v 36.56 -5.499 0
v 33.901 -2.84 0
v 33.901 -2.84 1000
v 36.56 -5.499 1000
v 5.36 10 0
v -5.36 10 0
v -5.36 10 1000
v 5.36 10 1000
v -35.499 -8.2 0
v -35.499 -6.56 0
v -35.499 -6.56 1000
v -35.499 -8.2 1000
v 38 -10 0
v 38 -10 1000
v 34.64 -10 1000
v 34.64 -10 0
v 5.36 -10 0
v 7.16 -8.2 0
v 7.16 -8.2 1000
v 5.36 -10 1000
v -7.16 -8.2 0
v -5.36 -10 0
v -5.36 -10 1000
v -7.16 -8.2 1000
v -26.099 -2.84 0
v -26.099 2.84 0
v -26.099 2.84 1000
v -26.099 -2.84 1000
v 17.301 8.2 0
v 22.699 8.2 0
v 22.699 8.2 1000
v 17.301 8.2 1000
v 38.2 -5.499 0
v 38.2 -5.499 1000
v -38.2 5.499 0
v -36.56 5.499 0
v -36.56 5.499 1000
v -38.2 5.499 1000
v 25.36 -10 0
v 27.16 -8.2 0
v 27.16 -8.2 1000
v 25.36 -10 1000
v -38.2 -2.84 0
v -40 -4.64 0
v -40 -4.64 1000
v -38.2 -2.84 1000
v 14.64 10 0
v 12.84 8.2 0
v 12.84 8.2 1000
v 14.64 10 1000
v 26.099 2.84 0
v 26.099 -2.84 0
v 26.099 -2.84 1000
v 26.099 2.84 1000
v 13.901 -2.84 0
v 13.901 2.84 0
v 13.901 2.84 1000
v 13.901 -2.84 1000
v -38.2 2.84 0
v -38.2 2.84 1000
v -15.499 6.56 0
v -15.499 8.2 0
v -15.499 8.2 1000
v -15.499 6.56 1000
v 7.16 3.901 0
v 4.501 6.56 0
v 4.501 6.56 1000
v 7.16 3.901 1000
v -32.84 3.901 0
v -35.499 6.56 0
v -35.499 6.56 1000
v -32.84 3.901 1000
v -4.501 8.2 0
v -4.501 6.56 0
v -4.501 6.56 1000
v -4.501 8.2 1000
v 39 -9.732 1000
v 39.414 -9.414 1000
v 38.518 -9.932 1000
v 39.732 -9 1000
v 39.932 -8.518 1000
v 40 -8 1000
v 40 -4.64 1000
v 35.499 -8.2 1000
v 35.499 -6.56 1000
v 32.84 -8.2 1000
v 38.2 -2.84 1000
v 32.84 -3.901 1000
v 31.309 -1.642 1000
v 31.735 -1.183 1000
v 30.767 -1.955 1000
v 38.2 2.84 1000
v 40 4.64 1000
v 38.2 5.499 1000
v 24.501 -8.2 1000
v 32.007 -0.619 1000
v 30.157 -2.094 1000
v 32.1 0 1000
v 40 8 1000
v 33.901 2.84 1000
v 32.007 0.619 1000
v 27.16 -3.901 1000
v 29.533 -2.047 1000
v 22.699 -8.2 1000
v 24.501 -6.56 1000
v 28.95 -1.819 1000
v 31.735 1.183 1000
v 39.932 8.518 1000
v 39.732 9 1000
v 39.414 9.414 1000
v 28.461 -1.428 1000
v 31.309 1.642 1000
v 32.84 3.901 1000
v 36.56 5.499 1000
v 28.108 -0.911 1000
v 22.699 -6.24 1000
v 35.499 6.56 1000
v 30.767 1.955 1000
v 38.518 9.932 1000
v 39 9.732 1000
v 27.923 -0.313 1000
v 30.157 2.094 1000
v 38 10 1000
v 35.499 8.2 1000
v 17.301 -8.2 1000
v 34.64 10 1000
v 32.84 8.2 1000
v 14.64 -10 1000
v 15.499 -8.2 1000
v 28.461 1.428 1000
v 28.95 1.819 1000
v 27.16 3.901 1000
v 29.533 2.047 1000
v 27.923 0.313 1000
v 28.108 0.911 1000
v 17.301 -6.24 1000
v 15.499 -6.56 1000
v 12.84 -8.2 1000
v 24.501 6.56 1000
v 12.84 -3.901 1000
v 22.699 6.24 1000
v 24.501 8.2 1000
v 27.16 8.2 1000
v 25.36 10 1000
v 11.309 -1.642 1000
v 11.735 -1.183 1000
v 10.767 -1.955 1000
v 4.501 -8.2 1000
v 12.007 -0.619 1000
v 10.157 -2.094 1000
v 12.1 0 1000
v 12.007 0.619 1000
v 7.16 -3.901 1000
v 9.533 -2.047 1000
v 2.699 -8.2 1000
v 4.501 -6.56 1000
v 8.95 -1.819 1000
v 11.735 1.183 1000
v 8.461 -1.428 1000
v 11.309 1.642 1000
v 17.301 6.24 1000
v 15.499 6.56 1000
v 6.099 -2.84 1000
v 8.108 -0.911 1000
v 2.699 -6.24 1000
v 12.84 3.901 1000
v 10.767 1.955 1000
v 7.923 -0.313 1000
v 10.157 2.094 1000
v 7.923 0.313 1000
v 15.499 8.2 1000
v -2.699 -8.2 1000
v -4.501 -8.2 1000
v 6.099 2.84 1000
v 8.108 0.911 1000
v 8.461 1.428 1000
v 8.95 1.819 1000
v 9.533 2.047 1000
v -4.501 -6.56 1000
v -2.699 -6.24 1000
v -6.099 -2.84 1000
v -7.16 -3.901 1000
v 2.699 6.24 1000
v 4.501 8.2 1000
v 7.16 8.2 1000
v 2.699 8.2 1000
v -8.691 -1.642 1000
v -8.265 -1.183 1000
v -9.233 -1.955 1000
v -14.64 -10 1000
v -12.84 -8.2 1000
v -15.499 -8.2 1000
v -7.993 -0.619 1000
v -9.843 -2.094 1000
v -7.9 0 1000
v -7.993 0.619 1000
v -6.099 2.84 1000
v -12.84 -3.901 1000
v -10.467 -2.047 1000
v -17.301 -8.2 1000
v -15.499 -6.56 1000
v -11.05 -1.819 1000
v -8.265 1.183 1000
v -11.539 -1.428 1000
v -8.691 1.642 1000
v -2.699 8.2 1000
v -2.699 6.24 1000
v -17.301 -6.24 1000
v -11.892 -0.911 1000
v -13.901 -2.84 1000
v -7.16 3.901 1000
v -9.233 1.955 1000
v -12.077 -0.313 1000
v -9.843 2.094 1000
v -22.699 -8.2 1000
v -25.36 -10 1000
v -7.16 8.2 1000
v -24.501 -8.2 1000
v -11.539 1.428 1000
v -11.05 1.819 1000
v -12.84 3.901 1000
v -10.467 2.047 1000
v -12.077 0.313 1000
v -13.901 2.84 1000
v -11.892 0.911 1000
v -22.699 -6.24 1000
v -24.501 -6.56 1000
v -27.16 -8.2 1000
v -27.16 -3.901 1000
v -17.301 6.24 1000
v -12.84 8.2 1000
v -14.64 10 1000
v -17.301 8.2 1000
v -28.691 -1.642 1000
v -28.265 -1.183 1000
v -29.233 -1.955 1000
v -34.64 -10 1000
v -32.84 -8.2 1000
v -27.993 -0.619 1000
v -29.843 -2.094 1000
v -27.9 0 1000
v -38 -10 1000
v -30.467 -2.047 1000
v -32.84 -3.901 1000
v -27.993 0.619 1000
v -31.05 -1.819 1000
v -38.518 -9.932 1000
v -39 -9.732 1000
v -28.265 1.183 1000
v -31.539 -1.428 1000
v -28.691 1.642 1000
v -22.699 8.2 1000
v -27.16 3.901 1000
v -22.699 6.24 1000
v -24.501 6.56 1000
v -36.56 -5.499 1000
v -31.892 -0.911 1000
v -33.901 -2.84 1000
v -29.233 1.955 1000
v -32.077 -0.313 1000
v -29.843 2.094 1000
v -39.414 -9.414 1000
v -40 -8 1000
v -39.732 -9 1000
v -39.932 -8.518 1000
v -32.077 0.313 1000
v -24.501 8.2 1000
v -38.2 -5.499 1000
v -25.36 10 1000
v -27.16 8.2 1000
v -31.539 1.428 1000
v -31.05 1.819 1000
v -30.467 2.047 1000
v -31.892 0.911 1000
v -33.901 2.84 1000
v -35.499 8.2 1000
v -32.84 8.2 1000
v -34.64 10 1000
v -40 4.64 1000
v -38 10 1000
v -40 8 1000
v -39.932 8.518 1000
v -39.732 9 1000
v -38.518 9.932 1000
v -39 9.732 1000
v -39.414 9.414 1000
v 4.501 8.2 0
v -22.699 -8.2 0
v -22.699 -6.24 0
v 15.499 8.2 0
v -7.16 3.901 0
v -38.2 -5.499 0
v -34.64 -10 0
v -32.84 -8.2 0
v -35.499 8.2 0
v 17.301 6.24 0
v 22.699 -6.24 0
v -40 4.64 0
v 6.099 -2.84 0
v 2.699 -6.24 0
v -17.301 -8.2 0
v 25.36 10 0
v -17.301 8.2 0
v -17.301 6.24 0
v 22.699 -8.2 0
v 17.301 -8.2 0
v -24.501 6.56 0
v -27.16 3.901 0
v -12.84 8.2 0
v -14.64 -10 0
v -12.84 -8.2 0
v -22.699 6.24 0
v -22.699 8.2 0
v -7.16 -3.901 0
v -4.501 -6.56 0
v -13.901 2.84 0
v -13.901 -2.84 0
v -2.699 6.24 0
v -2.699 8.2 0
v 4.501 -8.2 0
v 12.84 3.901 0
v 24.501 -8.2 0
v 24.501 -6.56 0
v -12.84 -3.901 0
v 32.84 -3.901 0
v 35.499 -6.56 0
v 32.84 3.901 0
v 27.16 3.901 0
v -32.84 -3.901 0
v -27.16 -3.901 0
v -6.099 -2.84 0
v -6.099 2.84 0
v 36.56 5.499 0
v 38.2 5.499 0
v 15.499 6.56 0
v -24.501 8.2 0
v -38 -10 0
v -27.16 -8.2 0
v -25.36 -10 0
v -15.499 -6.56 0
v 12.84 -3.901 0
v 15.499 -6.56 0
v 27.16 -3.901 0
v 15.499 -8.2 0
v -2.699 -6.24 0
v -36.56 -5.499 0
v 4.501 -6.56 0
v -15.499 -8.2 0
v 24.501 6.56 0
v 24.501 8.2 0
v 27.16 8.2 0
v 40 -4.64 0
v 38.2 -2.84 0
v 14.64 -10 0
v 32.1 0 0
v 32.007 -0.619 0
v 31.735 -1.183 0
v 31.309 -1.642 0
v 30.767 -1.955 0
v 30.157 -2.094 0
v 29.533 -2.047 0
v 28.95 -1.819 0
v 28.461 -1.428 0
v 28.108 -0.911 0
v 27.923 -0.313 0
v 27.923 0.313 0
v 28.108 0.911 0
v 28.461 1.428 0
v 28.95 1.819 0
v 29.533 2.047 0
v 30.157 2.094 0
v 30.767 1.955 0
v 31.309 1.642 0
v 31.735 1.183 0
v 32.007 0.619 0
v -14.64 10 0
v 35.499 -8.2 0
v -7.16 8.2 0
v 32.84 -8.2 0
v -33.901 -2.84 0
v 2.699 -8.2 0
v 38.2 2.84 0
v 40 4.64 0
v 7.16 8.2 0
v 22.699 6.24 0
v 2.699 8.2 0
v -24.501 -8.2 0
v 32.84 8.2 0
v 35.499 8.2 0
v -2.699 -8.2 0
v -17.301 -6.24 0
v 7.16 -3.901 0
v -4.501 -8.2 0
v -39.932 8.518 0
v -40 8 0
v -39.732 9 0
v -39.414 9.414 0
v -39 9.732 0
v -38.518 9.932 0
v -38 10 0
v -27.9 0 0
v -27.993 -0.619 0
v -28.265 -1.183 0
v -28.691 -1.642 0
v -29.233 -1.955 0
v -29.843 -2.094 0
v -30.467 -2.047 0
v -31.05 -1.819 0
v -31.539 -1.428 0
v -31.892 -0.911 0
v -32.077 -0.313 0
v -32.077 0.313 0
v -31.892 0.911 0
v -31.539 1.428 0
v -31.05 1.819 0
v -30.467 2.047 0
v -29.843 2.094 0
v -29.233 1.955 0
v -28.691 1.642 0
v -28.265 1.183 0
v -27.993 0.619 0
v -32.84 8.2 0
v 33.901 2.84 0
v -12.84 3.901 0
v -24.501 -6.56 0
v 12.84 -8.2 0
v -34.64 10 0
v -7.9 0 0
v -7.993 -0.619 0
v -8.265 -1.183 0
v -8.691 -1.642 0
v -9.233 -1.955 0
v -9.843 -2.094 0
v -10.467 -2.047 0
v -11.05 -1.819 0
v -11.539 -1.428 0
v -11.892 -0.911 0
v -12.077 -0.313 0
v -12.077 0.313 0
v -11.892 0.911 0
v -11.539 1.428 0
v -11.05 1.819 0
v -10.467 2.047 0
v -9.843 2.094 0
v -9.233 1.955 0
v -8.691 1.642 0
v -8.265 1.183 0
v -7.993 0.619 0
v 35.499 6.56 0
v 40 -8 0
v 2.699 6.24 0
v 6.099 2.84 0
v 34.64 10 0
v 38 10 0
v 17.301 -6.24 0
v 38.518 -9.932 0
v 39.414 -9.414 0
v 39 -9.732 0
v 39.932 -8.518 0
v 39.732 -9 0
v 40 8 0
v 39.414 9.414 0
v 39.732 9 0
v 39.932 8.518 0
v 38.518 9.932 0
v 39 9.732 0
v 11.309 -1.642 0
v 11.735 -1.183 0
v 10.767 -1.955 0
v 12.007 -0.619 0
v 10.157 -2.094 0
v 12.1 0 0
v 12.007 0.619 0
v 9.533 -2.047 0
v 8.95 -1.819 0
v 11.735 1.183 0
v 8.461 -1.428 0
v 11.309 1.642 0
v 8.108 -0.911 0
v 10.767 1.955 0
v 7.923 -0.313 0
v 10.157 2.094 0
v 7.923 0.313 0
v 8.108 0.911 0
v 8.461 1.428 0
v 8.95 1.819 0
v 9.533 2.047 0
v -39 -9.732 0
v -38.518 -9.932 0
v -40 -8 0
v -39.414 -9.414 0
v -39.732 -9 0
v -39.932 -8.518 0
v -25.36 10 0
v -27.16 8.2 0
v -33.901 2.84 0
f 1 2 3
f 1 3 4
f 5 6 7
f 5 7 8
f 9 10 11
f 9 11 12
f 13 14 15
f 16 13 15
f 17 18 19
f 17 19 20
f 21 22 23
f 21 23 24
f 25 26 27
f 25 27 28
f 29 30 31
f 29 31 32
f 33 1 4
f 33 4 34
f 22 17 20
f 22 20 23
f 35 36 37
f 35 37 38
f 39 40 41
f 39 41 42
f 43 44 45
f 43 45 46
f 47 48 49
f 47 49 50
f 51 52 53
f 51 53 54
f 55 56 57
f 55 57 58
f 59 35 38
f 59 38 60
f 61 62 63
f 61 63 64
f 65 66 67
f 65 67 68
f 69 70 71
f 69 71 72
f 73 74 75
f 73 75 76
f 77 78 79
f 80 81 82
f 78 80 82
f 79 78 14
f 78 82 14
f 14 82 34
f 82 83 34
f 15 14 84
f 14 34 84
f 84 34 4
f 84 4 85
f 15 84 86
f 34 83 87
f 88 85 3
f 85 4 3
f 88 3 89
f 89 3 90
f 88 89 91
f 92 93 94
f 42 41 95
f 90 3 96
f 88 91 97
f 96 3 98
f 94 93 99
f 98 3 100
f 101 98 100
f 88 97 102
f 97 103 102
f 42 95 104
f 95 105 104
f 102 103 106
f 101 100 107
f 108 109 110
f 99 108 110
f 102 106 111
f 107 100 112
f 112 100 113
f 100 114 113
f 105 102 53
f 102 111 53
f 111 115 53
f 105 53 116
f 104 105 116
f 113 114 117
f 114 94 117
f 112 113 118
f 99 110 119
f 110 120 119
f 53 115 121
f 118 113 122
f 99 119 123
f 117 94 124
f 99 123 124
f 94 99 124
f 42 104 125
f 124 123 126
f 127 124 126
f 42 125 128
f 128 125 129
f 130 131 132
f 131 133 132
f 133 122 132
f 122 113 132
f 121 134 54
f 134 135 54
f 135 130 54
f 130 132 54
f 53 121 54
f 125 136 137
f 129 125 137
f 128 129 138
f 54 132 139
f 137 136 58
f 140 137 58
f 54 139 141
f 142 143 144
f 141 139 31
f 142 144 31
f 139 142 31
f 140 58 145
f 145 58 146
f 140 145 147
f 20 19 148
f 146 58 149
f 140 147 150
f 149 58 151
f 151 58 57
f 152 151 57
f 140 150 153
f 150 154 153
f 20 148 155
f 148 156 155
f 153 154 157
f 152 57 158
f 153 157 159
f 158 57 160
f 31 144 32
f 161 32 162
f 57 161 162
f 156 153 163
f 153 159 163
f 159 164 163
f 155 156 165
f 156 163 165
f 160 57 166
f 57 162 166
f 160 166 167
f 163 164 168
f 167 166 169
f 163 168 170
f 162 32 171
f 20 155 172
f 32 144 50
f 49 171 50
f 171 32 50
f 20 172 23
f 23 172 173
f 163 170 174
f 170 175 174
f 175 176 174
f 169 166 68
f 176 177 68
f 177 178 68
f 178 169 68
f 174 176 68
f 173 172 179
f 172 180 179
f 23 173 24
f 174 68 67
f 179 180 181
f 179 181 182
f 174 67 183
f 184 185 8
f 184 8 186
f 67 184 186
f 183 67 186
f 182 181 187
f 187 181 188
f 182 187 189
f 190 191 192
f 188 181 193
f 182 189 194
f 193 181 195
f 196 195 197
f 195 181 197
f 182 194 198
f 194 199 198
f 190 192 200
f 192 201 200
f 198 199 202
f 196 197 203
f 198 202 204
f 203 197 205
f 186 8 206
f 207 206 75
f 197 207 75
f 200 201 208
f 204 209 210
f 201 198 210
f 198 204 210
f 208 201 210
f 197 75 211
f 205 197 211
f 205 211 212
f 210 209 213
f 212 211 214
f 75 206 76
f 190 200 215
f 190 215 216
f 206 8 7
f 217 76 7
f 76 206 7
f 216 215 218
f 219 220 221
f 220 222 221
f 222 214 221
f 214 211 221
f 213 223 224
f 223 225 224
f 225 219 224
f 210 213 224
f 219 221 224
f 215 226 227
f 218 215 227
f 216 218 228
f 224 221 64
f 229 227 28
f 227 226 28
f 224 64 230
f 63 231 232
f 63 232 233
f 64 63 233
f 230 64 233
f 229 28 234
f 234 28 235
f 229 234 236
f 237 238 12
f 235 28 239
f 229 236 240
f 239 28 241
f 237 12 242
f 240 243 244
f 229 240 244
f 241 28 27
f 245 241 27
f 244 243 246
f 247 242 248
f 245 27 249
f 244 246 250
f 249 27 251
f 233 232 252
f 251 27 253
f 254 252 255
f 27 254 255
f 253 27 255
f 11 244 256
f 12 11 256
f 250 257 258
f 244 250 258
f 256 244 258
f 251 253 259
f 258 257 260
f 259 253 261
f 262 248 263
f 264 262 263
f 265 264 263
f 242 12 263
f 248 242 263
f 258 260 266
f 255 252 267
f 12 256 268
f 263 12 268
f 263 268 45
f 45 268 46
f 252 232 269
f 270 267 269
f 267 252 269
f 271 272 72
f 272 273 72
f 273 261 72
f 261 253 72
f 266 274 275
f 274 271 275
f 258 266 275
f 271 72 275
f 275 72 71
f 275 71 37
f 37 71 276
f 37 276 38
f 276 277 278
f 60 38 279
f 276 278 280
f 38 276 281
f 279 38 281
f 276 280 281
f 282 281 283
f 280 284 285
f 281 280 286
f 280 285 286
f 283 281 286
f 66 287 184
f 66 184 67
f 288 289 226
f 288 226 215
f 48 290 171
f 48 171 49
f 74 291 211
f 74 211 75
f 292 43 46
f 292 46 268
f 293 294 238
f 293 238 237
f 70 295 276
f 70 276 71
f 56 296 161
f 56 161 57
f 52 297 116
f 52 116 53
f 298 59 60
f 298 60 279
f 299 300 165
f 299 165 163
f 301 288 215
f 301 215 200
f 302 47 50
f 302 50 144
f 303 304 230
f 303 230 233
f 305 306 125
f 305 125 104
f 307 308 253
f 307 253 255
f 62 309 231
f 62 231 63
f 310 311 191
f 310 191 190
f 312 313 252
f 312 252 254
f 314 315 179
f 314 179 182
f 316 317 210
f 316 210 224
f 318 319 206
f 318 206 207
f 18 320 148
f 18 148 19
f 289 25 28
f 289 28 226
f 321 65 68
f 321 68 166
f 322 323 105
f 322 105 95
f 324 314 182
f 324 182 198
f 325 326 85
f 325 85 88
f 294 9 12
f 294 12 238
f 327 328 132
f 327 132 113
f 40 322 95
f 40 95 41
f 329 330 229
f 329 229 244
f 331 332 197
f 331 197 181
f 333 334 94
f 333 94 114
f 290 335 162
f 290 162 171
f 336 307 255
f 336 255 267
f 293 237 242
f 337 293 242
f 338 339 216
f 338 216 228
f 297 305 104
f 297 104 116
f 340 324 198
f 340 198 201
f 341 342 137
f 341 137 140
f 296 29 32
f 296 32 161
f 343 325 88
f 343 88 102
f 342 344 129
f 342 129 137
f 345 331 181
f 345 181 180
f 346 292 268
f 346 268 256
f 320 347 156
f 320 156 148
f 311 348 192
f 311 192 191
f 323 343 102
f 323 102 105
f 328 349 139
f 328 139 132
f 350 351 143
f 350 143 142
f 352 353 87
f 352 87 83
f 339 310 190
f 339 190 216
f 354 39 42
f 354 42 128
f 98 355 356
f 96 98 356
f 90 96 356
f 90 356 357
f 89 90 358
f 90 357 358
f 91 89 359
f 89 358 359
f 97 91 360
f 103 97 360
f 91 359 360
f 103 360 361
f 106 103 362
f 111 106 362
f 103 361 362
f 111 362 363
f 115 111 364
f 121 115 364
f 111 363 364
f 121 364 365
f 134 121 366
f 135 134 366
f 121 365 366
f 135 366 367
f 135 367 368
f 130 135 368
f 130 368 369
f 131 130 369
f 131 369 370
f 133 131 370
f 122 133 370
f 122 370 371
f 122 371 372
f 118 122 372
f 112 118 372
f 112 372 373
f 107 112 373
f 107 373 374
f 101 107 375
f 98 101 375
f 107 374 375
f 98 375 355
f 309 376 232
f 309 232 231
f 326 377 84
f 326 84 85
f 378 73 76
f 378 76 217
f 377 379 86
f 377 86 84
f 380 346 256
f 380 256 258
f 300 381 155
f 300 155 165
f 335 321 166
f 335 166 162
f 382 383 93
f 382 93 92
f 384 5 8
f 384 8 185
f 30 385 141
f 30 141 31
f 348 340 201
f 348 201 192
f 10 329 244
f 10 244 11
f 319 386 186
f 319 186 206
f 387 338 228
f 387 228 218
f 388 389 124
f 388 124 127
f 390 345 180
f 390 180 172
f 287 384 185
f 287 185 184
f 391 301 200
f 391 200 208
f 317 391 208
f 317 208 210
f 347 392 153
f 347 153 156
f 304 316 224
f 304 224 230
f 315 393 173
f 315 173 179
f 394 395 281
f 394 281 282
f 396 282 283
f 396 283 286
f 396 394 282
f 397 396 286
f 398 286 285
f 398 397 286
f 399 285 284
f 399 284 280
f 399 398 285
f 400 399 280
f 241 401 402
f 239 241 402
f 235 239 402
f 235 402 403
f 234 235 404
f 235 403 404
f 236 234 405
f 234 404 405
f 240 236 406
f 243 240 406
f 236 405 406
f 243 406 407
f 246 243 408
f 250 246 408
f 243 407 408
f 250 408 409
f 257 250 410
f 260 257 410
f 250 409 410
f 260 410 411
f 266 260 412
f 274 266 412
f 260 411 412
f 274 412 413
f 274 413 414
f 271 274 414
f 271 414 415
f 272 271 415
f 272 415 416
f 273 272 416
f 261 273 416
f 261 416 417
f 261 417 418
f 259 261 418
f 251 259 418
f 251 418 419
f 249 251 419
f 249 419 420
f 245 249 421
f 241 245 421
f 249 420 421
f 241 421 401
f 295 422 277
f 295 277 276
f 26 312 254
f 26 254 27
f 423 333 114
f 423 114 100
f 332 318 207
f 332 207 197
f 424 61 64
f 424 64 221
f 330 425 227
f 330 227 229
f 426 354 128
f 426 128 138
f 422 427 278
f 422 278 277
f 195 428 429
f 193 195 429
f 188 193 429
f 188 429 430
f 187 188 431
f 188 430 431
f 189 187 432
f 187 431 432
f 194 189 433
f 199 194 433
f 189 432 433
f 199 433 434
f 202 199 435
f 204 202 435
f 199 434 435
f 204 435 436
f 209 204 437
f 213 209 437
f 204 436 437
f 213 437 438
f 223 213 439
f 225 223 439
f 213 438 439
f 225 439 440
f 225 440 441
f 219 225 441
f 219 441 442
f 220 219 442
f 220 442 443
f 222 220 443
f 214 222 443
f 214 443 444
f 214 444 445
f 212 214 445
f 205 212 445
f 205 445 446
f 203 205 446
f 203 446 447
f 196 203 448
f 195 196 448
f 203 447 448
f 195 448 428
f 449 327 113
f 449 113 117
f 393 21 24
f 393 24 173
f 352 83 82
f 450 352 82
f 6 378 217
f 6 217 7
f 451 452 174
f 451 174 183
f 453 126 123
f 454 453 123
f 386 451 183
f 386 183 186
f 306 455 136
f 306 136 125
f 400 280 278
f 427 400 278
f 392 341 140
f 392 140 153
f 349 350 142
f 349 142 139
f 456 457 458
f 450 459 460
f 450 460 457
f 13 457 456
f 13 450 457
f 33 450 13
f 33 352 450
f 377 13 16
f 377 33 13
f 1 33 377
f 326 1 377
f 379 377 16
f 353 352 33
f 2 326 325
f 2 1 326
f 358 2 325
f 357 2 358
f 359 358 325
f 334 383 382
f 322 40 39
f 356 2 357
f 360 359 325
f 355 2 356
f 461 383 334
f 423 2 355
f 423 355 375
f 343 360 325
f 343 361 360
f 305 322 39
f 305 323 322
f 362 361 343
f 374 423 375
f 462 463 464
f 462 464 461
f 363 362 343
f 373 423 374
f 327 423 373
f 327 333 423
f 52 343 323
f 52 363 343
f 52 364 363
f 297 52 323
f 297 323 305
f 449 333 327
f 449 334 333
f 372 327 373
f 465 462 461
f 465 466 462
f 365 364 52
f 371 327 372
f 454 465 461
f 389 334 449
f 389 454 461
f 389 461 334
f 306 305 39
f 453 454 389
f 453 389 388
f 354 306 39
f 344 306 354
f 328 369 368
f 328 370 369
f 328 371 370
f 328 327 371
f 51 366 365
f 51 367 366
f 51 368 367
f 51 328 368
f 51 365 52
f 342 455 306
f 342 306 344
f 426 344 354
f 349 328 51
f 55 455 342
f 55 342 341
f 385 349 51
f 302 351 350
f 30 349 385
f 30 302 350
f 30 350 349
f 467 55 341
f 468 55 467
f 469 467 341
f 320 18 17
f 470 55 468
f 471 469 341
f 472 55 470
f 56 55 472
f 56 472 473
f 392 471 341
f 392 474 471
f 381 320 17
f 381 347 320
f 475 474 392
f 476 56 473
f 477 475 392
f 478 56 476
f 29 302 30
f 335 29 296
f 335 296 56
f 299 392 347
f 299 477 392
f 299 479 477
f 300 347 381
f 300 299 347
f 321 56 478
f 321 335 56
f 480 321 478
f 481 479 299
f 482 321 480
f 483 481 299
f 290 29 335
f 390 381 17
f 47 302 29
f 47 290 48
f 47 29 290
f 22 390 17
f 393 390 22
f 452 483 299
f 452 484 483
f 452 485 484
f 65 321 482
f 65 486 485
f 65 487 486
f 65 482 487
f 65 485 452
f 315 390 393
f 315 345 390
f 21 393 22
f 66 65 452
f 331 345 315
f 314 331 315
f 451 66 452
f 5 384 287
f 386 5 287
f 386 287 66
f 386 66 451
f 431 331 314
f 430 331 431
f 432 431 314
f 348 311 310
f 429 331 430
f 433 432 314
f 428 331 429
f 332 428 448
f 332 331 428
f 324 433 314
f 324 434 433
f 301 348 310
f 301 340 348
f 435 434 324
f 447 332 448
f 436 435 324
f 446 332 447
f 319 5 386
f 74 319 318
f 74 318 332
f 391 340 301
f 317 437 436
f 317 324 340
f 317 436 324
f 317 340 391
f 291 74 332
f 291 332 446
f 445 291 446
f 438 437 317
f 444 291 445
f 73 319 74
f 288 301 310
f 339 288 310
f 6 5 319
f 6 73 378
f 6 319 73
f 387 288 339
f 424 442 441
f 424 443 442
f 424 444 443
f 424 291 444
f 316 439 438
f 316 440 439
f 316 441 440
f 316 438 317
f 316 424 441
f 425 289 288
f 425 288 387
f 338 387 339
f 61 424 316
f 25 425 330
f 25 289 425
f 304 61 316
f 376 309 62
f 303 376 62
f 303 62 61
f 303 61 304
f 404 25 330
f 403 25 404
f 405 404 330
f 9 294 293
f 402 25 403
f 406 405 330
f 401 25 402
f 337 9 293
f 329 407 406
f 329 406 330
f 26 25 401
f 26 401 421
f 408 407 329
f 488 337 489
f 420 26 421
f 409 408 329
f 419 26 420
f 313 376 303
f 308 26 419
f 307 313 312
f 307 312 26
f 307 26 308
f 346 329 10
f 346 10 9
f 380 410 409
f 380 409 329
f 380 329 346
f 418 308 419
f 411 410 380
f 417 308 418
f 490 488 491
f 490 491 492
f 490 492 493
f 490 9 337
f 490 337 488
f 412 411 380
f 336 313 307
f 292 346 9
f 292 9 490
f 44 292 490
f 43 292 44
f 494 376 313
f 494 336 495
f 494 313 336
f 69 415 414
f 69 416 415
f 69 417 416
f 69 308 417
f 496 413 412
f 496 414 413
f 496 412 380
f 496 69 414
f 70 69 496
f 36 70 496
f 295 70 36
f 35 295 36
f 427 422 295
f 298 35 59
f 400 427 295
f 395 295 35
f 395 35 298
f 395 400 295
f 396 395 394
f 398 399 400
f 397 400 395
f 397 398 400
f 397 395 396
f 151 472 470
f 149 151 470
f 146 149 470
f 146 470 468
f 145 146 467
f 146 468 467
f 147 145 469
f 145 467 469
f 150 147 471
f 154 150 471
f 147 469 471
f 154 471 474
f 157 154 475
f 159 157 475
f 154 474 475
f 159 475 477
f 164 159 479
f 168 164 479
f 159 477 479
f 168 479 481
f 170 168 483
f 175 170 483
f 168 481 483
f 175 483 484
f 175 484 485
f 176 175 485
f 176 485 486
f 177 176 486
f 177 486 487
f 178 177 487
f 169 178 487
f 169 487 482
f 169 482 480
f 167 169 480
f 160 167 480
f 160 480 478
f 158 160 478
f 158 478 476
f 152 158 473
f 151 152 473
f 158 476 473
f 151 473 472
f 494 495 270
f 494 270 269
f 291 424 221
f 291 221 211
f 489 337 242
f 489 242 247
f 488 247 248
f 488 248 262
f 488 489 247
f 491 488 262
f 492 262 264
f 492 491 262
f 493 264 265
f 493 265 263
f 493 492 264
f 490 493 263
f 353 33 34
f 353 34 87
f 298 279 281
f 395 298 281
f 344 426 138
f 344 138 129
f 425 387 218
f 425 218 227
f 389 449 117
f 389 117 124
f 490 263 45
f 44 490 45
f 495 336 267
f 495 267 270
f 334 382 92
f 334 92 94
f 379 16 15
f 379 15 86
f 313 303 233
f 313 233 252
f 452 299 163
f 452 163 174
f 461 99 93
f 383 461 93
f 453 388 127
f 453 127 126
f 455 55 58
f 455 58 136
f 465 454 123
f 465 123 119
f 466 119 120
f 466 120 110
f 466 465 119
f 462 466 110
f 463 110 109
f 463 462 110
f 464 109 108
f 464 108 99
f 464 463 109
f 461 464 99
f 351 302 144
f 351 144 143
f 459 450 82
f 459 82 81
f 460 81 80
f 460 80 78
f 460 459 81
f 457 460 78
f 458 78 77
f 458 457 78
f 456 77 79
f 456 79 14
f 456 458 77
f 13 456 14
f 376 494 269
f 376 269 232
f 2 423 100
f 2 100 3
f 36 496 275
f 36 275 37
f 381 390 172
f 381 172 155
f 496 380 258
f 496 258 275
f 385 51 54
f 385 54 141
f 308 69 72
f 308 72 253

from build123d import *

# Parameters (mm, degrees)
SKETCH1_R           = 2.1
BOSS_EXTRUDE1_DEPTH = 1000


with BuildPart() as part:
    # Sketch1 → Boss-Extrude1 (new body)
    with BuildSketch(Plane(origin=(0, 0, 0), x_dir=(-1, 0, 0), z_dir=(0, 0, -1))):
        with BuildLine():
            Line((15.499339828, -8.2), (12.84, -8.2))
            Line((12.84, -8.2), (14.64, -10))
            Line((14.64, -10), (25.36, -10))
            Line((25.36, -10), (27.16, -8.2))
            Line((27.16, -8.2), (24.500660172, -8.2))
            Line((24.500660172, -8.2), (24.500660172, -6.56))
            Line((24.500660172, -6.56), (27.16, -3.900660172))
            Line((27.16, -3.900660172), (32.84, -3.900660172))
            Line((32.84, -3.900660172), (35.499339828, -6.56))
            Line((35.499339828, -6.56), (35.499339828, -8.2))
            Line((35.499339828, -8.2), (32.84, -8.2))
            Line((32.84, -8.2), (34.64, -10))
            Line((34.64, -10), (38, -10))
            ThreePointArc((38, -10), (39.414213562, -9.414213562), (40, -8))
            Line((40, -8), (40, -4.64))
            Line((40, -4.64), (38.2, -2.84))
            Line((38.2, -2.84), (38.2, -5.499339828))
            Line((38.2, -5.499339828), (36.56, -5.499339828))
            Line((36.56, -5.499339828), (33.900660172, -2.84))
            Line((33.900660172, -2.84), (33.900660172, 2.84))
            Line((33.900660172, 2.84), (36.56, 5.499339828))
            Line((36.56, 5.499339828), (38.2, 5.499339828))
            Line((38.2, 5.499339828), (38.2, 2.84))
            Line((38.2, 2.84), (40, 4.64))
            Line((40, 4.64), (40, 8))
            ThreePointArc((40, 8), (39.414213562, 9.414213562), (38, 10))
            Line((38, 10), (34.64, 10))
            Line((34.64, 10), (32.84, 8.2))
            Line((32.84, 8.2), (35.499339828, 8.2))
            Line((35.499339828, 8.2), (35.499339828, 6.56))
            Line((35.499339828, 6.56), (32.84, 3.900660172))
            Line((32.84, 3.900660172), (27.16, 3.900660172))
            Line((27.16, 3.900660172), (24.500660172, 6.56))
            Line((24.500660172, 6.56), (24.500660172, 8.2))
            Line((24.500660172, 8.2), (27.16, 8.2))
            Line((27.16, 8.2), (25.36, 10))
            Line((25.36, 10), (14.64, 10))
            Line((14.64, 10), (12.84, 8.2))
            Line((12.84, 8.2), (15.499339828, 8.2))
            Line((15.499339828, 8.2), (15.499339828, 6.56))
            Line((15.499339828, 6.56), (12.84, 3.900660172))
            Line((12.84, 3.900660172), (7.16, 3.900660172))
            Line((7.16, 3.900660172), (4.500660172, 6.56))
            Line((4.500660172, 6.56), (4.500660172, 8.2))
            Line((4.500660172, 8.2), (7.16, 8.2))
            Line((7.16, 8.2), (5.36, 10))
            Line((5.36, 10), (-5.36, 10))
            Line((-5.36, 10), (-7.16, 8.2))
            Line((-7.16, 8.2), (-4.500660172, 8.2))
            Line((-4.500660172, 8.2), (-4.500660172, 6.56))
            Line((-4.500660172, 6.56), (-7.16, 3.900660172))
            Line((-7.16, 3.900660172), (-12.84, 3.900660172))
            Line((-12.84, 3.900660172), (-15.499339828, 6.56))
            Line((-15.499339828, 6.56), (-15.499339828, 8.2))
            Line((-15.499339828, 8.2), (-12.84, 8.2))
            Line((-12.84, 8.2), (-14.64, 10))
            Line((-14.64, 10), (-25.36, 10))
            Line((-25.36, 10), (-27.16, 8.2))
            Line((-27.16, 8.2), (-24.500660172, 8.2))
            Line((-24.500660172, 8.2), (-24.500660172, 6.56))
            Line((-24.500660172, 6.56), (-27.16, 3.900660172))
            Line((-27.16, 3.900660172), (-32.84, 3.900660172))
            Line((-32.84, 3.900660172), (-35.499339828, 6.56))
            Line((-35.499339828, 6.56), (-35.499339828, 8.2))
            Line((-35.499339828, 8.2), (-32.84, 8.2))
            Line((-32.84, 8.2), (-34.64, 10))
            Line((-34.64, 10), (-38, 10))
            ThreePointArc((-38, 10), (-39.414213562, 9.414213562), (-40, 8))
            Line((-40, 8), (-40, 4.64))
            Line((-40, 4.64), (-38.2, 2.84))
            Line((-38.2, 2.84), (-38.2, 5.499339828))
            Line((-38.2, 5.499339828), (-36.56, 5.499339828))
            Line((-36.56, 5.499339828), (-33.900660172, 2.84))
            Line((-33.900660172, 2.84), (-33.900660172, -2.84))
            Line((-33.900660172, -2.84), (-36.56, -5.499339828))
            Line((-36.56, -5.499339828), (-38.2, -5.499339828))
            Line((-38.2, -5.499339828), (-38.2, -2.84))
            Line((-38.2, -2.84), (-40, -4.64))
            Line((-40, -4.64), (-40, -8))
            ThreePointArc((-40, -8), (-39.414213562, -9.414213562), (-38, -10))
            Line((-38, -10), (-34.64, -10))
            Line((-34.64, -10), (-32.84, -8.2))
            Line((-32.84, -8.2), (-35.499339828, -8.2))
            Line((-35.499339828, -8.2), (-35.499339828, -6.56))
            Line((-35.499339828, -6.56), (-32.84, -3.900660172))
            Line((-32.84, -3.900660172), (-27.16, -3.900660172))
            Line((-27.16, -3.900660172), (-24.500660172, -6.56))
            Line((-24.500660172, -6.56), (-24.500660172, -8.2))
            Line((-24.500660172, -8.2), (-27.16, -8.2))
            Line((-27.16, -8.2), (-25.36, -10))
            Line((-25.36, -10), (-14.64, -10))
            Line((-14.64, -10), (-12.84, -8.2))
            Line((-12.84, -8.2), (-15.499339828, -8.2))
            Line((-15.499339828, -8.2), (-15.499339828, -6.56))
            Line((-15.499339828, -6.56), (-12.84, -3.900660172))
            Line((-12.84, -3.900660172), (-7.16, -3.900660172))
            Line((-7.16, -3.900660172), (-4.500660172, -6.56))
            Line((-4.500660172, -6.56), (-4.500660172, -8.2))
            Line((-4.500660172, -8.2), (-7.16, -8.2))
            Line((-7.16, -8.2), (-5.36, -10))
            Line((-5.36, -10), (5.36, -10))
            Line((5.36, -10), (7.16, -8.2))
            Line((7.16, -8.2), (4.500660172, -8.2))
            Line((4.500660172, -8.2), (4.500660172, -6.56))
            Line((4.500660172, -6.56), (7.16, -3.900660172))
            Line((7.16, -3.900660172), (12.84, -3.900660172))
            Line((12.84, -3.900660172), (15.499339828, -6.56))
            Line((15.499339828, -6.56), (15.499339828, -8.2))
        make_face()
        with Locations(Location((10, 0, 0), (0, 0, 180))):
            Circle(SKETCH1_R, mode=Mode.SUBTRACT)
        with Locations(Location((30, 0, 0), (0, 0, 180))):
            Circle(SKETCH1_R, mode=Mode.SUBTRACT)
        with Locations(Location((-10, 0, 0), (0, 0, 180))):
            Circle(SKETCH1_R, mode=Mode.SUBTRACT)
        with Locations(Location((-30, 0, 0), (0, 0, 180))):
            Circle(SKETCH1_R, mode=Mode.SUBTRACT)
        Polygon((17.300660172, -6.24), (13.900660172, -2.84), (13.900660172, 2.84), (17.300660172, 6.24), (17.300660172, 8.2), (22.699339828, 8.2), (22.699339828, 6.24), (26.099339828, 2.84), (26.099339828, -2.84), (22.699339828, -6.24), (22.699339828, -8.2), (17.300660172, -8.2), align=None, mode=Mode.SUBTRACT)
        Polygon((2.699339828, 6.24), (6.099339828, 2.84), (6.099339828, -2.84), (2.699339828, -6.24), (2.699339828, -8.2), (-2.699339828, -8.2), (-2.699339828, -6.24), (-6.099339828, -2.84), (-6.099339828, 2.84), (-2.699339828, 6.24), (-2.699339828, 8.2), (2.699339828, 8.2), align=None, mode=Mode.SUBTRACT)
        Polygon((-13.900660172, -2.84), (-17.300660172, -6.24), (-17.300660172, -8.2), (-22.699339828, -8.2), (-22.699339828, -6.24), (-26.099339828, -2.84), (-26.099339828, 2.84), (-22.699339828, 6.24), (-22.699339828, 8.2), (-17.300660172, 8.2), (-17.300660172, 6.24), (-13.900660172, 2.84), align=None, mode=Mode.SUBTRACT)
    extrude(amount=-BOSS_EXTRUDE1_DEPTH)


solid = part.part
